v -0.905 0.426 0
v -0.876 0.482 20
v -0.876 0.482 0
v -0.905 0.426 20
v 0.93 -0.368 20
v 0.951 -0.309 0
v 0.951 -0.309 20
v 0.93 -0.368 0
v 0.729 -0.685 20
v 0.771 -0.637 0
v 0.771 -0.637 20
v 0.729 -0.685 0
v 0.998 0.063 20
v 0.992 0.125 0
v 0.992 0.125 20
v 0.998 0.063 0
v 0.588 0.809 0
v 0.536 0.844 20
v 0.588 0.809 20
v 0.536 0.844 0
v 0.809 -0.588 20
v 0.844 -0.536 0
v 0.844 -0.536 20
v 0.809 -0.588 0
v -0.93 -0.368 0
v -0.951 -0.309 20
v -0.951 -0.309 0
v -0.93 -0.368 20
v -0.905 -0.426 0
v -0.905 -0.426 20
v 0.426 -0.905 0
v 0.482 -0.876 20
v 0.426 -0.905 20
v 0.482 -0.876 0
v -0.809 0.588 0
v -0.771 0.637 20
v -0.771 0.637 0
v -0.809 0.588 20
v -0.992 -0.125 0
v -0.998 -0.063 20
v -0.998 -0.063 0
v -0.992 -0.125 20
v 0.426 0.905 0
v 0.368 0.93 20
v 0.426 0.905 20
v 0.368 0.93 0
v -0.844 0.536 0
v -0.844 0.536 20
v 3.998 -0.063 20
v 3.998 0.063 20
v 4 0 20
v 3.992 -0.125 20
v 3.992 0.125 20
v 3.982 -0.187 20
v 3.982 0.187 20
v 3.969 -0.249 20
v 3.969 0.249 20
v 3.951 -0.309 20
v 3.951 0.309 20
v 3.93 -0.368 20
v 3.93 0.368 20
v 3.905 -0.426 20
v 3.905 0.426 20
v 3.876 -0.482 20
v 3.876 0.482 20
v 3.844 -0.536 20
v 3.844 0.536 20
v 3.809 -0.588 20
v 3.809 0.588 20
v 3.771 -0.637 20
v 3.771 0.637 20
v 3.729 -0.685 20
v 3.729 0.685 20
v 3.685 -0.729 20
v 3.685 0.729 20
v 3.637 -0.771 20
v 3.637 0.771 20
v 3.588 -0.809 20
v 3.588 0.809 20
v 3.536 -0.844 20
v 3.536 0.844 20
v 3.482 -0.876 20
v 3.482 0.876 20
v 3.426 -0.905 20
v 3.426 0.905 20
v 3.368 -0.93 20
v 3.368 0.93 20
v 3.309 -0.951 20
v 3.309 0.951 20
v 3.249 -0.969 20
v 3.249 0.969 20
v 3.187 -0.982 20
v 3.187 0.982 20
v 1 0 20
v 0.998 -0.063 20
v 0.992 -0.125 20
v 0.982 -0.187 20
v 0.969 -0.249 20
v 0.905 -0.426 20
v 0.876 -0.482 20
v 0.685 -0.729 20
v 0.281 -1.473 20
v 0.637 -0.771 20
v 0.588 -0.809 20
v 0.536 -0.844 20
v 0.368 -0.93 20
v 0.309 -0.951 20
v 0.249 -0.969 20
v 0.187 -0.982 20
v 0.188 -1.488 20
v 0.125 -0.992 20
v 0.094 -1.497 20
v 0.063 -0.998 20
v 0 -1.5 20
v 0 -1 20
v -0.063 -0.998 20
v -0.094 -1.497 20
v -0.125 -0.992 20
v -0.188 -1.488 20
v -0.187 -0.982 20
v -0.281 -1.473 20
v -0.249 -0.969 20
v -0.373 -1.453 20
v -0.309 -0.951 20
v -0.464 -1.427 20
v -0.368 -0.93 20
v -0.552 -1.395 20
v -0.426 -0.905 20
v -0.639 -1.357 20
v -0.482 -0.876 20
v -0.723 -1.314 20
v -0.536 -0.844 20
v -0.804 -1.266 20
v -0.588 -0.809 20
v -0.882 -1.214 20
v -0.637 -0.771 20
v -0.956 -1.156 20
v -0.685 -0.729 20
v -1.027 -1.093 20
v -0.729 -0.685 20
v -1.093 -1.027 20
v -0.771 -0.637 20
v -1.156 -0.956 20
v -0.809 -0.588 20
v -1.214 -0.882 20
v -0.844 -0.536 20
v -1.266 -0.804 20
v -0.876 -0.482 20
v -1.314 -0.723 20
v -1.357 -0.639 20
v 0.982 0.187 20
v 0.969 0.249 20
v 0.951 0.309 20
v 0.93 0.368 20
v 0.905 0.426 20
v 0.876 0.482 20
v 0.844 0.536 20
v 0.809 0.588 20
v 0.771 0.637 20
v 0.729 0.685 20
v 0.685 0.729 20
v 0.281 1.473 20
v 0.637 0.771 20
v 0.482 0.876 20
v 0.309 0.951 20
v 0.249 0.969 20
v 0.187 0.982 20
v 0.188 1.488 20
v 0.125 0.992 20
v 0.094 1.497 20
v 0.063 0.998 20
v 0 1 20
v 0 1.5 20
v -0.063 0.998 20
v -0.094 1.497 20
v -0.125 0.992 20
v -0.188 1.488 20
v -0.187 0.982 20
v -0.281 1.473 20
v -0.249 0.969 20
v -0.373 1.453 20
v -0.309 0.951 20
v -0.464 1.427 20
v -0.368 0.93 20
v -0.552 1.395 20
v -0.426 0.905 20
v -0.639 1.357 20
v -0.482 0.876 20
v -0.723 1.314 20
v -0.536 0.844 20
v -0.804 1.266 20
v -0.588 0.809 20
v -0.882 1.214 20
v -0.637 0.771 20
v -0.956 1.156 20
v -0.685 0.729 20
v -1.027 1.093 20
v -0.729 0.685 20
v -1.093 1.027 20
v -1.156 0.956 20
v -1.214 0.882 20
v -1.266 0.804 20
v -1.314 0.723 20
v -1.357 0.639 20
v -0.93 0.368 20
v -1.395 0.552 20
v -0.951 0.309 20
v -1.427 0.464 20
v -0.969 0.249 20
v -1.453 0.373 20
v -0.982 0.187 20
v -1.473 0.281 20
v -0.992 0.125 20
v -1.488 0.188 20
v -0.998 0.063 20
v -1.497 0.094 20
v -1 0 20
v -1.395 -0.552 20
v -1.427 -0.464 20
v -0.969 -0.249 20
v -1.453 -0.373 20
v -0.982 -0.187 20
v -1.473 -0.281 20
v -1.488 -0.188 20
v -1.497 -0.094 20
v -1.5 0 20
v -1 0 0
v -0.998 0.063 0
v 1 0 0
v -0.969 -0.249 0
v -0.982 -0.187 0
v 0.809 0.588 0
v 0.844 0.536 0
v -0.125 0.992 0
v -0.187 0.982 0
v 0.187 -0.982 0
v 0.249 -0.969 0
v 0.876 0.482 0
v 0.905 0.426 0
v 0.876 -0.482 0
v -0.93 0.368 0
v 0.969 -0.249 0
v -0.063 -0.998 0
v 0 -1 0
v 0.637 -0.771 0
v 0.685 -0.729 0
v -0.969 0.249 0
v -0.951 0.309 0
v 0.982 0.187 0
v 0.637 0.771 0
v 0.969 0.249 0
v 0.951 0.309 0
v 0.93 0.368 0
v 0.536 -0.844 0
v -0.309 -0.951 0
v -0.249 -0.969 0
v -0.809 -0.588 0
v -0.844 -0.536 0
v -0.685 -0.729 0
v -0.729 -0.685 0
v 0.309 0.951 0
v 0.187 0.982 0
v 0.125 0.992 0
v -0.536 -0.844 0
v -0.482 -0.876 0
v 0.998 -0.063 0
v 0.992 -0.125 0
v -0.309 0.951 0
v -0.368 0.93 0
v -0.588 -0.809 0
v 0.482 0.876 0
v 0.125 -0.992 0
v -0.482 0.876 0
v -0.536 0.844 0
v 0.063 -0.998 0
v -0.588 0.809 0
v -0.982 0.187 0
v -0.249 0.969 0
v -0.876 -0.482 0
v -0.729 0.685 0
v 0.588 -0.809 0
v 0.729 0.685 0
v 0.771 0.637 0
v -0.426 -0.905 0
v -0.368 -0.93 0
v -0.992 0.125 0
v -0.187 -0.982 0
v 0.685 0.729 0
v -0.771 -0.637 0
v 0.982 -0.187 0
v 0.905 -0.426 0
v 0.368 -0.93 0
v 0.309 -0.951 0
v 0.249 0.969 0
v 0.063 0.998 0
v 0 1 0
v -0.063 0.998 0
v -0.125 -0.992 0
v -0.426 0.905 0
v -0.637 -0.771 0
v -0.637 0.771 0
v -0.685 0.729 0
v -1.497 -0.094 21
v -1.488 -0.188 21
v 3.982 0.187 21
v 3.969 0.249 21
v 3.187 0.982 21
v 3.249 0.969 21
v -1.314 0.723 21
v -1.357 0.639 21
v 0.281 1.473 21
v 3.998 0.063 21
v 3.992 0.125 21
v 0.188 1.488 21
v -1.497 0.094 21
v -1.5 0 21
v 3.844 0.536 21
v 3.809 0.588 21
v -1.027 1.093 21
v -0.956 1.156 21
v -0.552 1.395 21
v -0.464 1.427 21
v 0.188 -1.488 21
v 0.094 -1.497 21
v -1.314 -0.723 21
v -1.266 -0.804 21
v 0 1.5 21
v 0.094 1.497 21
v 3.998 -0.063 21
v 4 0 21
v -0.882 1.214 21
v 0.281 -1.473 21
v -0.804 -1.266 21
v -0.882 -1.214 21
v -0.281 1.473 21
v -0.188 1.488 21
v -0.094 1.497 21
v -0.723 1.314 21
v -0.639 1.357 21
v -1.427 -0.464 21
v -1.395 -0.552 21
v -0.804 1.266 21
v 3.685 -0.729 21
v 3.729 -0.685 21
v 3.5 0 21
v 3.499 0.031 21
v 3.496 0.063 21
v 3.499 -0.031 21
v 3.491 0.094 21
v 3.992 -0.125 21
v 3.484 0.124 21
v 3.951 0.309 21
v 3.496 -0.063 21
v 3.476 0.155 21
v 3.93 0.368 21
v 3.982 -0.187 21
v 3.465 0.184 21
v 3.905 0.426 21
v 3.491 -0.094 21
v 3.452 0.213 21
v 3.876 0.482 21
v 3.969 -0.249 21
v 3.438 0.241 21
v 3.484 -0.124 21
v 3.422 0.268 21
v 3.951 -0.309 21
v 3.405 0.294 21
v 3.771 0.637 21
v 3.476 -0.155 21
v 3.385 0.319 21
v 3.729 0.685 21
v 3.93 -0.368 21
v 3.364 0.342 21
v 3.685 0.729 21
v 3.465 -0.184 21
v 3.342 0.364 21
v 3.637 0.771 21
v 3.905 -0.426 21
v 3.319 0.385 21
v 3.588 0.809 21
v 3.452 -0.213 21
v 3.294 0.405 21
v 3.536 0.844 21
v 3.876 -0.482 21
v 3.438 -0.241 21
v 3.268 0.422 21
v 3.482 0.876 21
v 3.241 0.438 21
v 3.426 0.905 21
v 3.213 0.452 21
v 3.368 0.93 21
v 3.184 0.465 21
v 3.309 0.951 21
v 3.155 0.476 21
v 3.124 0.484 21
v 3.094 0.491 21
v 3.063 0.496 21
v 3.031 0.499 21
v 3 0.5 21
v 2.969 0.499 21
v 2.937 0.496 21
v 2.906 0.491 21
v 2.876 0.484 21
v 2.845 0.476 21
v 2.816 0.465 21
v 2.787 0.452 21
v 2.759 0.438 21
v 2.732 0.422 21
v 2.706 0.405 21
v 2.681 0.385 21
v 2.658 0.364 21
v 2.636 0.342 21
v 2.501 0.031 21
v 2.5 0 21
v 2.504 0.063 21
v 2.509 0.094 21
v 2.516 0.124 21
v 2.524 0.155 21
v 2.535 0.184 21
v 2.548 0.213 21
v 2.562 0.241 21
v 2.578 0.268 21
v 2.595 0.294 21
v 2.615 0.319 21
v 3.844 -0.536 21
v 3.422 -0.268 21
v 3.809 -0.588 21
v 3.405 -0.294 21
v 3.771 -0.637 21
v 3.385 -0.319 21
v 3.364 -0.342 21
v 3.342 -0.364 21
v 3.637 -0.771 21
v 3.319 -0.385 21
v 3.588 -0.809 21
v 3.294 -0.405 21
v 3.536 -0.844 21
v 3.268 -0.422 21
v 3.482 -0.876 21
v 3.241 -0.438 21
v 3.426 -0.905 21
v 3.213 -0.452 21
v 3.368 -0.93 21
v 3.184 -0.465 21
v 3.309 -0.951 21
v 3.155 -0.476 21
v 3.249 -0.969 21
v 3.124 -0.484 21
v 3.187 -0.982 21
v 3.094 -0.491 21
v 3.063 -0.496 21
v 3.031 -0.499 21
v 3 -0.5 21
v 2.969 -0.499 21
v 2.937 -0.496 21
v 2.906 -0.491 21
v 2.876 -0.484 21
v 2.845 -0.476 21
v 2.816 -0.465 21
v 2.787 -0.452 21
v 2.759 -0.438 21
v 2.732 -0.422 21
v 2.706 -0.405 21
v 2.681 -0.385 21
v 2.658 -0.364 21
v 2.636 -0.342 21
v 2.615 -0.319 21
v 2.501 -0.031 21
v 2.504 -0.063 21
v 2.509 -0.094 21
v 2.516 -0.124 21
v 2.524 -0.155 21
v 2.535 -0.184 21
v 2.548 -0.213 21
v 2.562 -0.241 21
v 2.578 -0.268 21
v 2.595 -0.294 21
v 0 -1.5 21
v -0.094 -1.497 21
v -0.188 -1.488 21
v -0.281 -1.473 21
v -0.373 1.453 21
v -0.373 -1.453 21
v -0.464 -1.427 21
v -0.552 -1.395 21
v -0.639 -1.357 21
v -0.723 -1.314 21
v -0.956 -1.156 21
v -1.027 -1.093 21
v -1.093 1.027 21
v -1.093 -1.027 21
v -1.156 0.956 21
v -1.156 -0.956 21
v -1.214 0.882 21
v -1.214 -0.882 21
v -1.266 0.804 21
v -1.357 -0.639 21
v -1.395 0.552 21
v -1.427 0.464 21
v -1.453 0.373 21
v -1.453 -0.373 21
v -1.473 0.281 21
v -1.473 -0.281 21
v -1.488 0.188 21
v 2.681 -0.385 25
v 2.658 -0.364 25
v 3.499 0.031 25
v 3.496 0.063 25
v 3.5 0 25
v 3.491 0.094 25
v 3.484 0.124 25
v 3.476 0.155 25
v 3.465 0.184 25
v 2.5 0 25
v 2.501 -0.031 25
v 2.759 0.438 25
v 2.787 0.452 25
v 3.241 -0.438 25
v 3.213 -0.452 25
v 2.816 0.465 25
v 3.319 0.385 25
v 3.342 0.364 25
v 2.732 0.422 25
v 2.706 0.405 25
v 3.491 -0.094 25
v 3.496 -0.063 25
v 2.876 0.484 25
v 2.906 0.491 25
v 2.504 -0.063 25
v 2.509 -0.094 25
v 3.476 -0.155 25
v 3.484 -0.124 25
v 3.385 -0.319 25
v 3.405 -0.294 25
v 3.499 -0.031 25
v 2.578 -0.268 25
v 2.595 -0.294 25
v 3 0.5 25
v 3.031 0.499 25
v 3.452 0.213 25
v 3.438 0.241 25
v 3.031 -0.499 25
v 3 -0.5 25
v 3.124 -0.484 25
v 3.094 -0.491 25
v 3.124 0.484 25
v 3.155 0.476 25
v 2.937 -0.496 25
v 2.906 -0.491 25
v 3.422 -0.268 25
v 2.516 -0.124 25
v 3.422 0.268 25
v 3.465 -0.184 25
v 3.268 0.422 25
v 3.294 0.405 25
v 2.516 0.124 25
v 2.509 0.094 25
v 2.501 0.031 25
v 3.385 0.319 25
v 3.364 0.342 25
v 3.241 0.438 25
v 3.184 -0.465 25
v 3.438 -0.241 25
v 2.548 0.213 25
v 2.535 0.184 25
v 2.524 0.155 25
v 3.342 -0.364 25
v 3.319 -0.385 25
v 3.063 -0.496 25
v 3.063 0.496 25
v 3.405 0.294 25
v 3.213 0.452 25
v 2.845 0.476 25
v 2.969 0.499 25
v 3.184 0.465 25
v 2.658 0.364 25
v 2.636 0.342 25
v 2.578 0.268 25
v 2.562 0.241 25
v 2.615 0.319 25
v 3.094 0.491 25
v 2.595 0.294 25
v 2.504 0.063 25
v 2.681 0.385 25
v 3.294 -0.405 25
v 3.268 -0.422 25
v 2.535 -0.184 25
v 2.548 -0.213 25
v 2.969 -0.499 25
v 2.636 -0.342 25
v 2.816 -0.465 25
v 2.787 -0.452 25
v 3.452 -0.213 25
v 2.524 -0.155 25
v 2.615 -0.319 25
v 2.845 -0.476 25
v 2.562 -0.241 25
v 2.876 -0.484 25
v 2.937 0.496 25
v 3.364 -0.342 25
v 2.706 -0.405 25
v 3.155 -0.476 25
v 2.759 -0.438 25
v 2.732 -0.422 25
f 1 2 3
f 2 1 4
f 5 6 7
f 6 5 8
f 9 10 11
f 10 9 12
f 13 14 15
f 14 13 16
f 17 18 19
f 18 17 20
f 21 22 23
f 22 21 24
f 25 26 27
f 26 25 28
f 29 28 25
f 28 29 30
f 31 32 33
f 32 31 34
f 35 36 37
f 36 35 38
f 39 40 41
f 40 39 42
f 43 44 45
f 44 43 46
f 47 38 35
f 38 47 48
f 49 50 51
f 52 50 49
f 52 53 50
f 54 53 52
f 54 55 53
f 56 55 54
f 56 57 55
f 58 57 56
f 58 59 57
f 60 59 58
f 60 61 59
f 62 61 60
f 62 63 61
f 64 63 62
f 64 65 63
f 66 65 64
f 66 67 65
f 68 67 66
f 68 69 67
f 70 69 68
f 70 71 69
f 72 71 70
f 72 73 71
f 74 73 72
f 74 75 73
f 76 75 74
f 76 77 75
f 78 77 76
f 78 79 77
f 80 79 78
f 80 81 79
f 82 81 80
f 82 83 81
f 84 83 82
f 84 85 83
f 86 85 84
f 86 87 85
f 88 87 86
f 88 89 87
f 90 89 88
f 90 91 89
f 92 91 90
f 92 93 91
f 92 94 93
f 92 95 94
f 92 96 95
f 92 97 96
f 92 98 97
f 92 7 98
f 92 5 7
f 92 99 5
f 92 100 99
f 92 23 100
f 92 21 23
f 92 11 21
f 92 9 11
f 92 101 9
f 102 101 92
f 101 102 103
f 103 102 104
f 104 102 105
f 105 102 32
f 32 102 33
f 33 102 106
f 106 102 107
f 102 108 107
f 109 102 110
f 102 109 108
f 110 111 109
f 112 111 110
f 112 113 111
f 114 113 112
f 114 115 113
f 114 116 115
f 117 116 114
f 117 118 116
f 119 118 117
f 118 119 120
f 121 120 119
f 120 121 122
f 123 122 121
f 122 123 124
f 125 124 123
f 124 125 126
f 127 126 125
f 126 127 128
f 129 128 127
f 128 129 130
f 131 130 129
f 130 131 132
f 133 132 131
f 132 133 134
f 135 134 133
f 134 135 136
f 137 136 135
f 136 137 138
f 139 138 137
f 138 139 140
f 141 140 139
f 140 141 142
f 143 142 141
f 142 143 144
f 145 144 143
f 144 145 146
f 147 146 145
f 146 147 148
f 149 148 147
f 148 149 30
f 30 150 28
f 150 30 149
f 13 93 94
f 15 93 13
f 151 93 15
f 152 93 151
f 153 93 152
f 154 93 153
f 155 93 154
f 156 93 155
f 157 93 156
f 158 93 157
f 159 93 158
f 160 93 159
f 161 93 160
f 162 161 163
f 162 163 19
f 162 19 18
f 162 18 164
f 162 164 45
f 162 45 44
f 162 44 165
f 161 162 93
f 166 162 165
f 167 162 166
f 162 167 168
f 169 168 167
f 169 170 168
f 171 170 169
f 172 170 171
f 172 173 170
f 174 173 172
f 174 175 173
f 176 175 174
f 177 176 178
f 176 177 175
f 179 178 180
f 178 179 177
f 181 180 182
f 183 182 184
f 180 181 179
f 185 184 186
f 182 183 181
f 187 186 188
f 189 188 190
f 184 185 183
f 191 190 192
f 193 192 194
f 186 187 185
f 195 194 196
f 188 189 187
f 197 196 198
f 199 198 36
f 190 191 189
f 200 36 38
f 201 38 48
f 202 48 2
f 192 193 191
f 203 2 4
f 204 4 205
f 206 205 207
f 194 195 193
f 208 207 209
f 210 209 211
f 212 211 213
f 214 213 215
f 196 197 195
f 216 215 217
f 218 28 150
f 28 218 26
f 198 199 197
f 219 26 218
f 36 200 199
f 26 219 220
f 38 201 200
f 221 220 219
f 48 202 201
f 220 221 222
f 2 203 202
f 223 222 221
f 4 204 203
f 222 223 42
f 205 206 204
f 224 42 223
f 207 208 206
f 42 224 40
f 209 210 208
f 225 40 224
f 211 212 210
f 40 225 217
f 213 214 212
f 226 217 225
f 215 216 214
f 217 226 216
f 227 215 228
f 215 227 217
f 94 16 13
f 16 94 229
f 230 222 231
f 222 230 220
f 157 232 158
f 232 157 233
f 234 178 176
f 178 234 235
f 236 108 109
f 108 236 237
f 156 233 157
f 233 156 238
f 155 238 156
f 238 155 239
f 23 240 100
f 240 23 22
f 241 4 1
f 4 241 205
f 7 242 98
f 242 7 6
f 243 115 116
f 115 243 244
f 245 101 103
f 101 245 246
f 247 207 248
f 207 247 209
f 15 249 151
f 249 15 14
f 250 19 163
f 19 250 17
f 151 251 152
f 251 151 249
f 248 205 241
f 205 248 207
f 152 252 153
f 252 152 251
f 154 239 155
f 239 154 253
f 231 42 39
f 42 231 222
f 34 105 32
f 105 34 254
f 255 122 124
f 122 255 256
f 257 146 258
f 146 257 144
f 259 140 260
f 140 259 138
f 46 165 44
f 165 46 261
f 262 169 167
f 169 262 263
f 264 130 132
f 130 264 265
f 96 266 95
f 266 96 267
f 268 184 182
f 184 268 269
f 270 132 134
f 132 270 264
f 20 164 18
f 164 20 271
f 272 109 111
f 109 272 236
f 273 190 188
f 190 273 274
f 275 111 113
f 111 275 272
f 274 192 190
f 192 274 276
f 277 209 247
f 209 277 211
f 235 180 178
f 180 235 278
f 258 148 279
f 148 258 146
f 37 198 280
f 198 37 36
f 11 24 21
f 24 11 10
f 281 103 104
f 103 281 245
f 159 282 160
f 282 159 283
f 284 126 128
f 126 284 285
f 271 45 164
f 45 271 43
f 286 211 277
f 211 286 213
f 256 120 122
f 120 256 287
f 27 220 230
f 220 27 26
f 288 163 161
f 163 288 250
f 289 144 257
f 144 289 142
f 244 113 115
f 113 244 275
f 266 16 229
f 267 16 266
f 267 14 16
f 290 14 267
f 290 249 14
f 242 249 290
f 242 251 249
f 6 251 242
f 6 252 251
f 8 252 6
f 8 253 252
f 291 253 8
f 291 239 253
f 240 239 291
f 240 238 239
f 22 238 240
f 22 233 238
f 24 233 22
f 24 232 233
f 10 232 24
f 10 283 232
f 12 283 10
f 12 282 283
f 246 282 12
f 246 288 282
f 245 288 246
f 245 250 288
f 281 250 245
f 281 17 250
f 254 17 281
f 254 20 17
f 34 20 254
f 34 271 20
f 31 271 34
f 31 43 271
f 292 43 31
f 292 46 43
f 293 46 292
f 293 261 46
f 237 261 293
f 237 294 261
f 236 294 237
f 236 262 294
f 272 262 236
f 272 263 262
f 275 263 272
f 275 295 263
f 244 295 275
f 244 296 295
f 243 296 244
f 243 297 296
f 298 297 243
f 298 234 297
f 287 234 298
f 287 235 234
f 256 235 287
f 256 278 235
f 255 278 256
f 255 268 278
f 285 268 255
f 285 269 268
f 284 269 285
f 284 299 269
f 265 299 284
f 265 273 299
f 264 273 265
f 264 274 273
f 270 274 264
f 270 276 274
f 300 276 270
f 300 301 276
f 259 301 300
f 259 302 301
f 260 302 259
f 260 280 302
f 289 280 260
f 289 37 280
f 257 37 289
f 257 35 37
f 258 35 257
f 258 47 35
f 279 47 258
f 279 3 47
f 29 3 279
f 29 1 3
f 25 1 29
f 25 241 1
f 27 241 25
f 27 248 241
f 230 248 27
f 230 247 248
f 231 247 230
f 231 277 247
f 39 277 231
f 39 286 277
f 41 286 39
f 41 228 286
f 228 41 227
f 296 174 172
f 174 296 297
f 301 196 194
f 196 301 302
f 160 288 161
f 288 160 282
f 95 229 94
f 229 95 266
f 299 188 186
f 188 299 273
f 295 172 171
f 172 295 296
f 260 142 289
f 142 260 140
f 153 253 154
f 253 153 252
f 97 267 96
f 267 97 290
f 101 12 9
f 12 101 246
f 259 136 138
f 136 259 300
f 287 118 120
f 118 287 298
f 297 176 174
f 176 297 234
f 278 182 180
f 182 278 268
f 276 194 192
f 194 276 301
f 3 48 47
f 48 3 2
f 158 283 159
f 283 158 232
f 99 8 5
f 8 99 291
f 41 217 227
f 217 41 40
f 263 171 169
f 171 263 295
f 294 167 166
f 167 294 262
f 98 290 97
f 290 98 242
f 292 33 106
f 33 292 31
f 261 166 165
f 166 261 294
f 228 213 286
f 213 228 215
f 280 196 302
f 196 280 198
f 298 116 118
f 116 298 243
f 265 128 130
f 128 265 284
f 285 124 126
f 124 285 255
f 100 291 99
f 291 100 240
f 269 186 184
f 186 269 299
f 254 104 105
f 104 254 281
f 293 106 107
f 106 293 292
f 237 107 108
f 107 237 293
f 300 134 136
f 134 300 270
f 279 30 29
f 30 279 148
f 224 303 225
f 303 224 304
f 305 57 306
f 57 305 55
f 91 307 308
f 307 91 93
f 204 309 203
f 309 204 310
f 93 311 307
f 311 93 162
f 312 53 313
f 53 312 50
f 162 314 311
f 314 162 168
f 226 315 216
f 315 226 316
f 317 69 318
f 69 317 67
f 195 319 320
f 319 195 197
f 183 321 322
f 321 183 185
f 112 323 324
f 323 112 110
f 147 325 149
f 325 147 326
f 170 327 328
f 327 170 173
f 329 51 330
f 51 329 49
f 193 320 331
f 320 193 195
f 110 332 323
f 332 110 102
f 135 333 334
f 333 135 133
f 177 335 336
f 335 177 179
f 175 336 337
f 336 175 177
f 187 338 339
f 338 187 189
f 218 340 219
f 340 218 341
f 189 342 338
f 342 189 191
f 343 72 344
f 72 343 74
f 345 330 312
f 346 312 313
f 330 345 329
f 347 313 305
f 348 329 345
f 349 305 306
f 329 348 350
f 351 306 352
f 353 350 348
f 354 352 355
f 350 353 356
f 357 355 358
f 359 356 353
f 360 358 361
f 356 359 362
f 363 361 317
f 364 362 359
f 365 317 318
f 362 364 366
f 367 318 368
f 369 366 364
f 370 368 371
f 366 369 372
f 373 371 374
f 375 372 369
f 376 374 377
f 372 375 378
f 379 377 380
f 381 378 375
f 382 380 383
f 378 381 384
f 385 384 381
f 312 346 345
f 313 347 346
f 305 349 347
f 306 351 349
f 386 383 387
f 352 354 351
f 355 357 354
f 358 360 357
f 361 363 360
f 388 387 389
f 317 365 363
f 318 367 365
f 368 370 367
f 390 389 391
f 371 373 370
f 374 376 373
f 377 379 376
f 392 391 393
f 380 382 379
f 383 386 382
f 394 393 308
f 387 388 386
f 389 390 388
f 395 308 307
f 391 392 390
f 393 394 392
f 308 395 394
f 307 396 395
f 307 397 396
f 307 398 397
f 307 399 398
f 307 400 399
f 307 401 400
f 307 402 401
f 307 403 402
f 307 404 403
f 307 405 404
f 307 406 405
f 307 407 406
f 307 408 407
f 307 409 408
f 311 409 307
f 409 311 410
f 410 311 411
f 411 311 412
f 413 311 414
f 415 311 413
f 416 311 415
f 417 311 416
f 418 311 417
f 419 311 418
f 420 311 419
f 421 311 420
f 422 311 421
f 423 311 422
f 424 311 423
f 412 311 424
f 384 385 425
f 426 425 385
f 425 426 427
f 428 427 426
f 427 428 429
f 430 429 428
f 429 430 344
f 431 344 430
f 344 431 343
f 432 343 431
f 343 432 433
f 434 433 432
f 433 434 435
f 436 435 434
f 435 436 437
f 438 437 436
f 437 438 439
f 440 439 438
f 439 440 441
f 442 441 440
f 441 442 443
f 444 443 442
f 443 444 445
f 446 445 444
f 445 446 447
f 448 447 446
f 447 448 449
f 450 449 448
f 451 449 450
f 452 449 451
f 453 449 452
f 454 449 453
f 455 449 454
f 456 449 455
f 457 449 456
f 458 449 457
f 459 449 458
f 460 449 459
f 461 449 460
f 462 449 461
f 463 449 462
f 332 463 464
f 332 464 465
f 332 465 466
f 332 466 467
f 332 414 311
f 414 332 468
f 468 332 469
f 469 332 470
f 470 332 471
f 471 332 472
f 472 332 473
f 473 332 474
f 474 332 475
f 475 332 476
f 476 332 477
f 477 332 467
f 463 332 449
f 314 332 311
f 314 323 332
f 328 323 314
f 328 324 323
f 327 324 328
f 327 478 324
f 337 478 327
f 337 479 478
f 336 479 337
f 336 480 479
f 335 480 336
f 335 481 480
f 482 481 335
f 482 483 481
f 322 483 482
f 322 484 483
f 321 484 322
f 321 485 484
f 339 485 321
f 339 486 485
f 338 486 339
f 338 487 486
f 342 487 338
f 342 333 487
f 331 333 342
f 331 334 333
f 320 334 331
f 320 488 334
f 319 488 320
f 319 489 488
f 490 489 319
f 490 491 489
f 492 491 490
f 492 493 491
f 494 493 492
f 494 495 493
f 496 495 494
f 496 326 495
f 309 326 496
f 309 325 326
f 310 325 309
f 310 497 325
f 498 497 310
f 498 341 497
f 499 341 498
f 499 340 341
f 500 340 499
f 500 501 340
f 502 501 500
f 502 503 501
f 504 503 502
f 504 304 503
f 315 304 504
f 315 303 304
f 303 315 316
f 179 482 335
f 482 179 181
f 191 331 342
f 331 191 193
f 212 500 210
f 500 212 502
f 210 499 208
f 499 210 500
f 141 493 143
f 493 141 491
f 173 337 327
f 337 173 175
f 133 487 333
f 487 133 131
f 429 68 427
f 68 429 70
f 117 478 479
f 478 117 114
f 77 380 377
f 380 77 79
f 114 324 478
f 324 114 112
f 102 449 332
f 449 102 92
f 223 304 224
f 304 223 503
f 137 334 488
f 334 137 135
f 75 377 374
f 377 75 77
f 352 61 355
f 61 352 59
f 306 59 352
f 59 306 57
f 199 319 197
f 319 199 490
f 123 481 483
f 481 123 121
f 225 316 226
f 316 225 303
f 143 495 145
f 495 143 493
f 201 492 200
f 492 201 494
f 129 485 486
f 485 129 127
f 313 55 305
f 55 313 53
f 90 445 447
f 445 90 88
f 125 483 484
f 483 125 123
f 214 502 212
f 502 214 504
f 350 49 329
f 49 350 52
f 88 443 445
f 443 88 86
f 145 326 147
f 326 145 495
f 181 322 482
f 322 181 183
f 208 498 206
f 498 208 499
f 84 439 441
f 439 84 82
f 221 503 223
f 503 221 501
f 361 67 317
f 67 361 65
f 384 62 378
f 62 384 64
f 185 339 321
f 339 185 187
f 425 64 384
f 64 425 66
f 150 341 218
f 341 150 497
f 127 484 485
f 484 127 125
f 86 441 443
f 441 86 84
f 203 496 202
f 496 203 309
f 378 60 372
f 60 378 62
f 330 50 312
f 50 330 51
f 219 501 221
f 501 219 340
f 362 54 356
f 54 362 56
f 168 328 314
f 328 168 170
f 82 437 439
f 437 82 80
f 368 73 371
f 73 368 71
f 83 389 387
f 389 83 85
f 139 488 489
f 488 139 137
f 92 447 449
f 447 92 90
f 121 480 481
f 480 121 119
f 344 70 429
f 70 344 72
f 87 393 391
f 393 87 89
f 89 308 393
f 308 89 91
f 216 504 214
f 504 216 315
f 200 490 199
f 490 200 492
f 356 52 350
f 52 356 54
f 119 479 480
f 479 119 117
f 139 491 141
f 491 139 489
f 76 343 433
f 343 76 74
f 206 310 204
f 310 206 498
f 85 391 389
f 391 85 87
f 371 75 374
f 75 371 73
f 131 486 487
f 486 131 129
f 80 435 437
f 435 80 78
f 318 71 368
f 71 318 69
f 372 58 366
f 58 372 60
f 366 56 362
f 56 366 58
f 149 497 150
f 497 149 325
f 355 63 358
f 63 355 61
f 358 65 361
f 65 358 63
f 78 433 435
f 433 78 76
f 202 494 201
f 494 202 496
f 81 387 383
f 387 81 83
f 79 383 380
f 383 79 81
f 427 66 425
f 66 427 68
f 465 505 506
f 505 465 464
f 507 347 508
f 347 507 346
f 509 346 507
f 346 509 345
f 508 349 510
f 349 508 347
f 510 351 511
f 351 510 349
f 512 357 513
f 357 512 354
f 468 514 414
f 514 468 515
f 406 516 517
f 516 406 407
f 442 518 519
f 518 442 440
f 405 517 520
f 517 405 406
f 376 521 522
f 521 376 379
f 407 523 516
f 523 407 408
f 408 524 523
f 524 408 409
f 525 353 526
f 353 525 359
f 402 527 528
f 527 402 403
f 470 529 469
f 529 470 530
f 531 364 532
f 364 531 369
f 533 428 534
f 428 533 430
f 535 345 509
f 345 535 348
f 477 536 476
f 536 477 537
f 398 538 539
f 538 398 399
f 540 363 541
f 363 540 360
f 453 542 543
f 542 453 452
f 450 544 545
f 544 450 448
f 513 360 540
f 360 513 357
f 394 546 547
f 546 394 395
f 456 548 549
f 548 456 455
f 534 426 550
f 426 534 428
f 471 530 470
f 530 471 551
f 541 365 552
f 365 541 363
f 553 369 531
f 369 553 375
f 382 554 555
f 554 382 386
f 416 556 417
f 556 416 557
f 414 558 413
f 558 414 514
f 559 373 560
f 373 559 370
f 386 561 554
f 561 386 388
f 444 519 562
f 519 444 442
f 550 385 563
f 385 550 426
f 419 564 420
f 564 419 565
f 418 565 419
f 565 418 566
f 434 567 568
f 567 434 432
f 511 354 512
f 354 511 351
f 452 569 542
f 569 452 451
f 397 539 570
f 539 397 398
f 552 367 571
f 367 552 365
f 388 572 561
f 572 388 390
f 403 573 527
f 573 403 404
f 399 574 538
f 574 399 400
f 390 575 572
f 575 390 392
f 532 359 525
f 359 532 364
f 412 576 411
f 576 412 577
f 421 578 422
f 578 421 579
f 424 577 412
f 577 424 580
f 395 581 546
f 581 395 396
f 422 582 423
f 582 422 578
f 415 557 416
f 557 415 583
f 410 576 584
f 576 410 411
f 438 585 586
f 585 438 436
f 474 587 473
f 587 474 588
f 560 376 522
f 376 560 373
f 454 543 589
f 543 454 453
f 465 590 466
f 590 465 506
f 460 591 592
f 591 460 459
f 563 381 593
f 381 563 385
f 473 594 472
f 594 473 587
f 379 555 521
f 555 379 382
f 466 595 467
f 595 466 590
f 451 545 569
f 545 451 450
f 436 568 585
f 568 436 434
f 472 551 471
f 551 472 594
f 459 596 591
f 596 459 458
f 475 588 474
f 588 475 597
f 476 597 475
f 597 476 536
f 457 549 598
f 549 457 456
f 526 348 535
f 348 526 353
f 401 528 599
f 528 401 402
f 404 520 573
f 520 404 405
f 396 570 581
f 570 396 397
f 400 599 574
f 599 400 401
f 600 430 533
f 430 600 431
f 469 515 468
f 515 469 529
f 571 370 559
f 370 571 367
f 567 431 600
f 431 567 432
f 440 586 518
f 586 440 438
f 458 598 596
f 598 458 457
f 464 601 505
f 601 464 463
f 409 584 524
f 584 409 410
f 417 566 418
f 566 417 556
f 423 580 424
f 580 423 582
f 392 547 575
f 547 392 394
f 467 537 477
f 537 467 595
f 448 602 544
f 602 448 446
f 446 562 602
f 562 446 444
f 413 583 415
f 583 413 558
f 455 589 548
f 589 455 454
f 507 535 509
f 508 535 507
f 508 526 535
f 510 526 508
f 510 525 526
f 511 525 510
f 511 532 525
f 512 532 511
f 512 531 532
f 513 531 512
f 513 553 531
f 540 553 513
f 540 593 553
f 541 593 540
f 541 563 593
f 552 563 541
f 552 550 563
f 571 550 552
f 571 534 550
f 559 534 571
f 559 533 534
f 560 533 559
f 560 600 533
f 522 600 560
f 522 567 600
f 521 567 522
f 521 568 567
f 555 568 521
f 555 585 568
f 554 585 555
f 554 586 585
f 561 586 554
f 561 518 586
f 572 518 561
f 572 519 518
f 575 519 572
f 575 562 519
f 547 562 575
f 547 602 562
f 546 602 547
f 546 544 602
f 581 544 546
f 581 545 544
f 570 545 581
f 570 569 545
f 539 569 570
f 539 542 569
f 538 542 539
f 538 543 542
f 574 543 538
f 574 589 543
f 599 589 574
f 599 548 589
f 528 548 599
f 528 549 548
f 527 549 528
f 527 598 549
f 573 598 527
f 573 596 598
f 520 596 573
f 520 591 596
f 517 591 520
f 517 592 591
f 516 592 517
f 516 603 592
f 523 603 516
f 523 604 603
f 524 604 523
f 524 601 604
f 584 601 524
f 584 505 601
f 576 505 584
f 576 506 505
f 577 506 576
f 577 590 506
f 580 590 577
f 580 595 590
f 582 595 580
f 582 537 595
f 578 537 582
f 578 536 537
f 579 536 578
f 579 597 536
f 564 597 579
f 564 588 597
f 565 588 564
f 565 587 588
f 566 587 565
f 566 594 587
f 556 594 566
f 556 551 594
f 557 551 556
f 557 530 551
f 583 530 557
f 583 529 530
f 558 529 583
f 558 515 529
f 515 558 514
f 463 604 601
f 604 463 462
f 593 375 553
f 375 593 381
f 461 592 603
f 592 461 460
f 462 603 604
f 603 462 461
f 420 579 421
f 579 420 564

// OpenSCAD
$fn=100;

module crank_shaft(_r, _h) {

	union() {
		cylinder(r=_r, h=_h);
		hull() {
			translate([0, 0, _h]) cylinder(r=1.5*_r, 1);
			translate([3*_r, 0, _h]) cylinder(r=_r, 1);
		}
		translate([3*_r, 0, _h]) cylinder(r=0.5*_r, 5);

	}

}

crank_shaft(1, 20);
